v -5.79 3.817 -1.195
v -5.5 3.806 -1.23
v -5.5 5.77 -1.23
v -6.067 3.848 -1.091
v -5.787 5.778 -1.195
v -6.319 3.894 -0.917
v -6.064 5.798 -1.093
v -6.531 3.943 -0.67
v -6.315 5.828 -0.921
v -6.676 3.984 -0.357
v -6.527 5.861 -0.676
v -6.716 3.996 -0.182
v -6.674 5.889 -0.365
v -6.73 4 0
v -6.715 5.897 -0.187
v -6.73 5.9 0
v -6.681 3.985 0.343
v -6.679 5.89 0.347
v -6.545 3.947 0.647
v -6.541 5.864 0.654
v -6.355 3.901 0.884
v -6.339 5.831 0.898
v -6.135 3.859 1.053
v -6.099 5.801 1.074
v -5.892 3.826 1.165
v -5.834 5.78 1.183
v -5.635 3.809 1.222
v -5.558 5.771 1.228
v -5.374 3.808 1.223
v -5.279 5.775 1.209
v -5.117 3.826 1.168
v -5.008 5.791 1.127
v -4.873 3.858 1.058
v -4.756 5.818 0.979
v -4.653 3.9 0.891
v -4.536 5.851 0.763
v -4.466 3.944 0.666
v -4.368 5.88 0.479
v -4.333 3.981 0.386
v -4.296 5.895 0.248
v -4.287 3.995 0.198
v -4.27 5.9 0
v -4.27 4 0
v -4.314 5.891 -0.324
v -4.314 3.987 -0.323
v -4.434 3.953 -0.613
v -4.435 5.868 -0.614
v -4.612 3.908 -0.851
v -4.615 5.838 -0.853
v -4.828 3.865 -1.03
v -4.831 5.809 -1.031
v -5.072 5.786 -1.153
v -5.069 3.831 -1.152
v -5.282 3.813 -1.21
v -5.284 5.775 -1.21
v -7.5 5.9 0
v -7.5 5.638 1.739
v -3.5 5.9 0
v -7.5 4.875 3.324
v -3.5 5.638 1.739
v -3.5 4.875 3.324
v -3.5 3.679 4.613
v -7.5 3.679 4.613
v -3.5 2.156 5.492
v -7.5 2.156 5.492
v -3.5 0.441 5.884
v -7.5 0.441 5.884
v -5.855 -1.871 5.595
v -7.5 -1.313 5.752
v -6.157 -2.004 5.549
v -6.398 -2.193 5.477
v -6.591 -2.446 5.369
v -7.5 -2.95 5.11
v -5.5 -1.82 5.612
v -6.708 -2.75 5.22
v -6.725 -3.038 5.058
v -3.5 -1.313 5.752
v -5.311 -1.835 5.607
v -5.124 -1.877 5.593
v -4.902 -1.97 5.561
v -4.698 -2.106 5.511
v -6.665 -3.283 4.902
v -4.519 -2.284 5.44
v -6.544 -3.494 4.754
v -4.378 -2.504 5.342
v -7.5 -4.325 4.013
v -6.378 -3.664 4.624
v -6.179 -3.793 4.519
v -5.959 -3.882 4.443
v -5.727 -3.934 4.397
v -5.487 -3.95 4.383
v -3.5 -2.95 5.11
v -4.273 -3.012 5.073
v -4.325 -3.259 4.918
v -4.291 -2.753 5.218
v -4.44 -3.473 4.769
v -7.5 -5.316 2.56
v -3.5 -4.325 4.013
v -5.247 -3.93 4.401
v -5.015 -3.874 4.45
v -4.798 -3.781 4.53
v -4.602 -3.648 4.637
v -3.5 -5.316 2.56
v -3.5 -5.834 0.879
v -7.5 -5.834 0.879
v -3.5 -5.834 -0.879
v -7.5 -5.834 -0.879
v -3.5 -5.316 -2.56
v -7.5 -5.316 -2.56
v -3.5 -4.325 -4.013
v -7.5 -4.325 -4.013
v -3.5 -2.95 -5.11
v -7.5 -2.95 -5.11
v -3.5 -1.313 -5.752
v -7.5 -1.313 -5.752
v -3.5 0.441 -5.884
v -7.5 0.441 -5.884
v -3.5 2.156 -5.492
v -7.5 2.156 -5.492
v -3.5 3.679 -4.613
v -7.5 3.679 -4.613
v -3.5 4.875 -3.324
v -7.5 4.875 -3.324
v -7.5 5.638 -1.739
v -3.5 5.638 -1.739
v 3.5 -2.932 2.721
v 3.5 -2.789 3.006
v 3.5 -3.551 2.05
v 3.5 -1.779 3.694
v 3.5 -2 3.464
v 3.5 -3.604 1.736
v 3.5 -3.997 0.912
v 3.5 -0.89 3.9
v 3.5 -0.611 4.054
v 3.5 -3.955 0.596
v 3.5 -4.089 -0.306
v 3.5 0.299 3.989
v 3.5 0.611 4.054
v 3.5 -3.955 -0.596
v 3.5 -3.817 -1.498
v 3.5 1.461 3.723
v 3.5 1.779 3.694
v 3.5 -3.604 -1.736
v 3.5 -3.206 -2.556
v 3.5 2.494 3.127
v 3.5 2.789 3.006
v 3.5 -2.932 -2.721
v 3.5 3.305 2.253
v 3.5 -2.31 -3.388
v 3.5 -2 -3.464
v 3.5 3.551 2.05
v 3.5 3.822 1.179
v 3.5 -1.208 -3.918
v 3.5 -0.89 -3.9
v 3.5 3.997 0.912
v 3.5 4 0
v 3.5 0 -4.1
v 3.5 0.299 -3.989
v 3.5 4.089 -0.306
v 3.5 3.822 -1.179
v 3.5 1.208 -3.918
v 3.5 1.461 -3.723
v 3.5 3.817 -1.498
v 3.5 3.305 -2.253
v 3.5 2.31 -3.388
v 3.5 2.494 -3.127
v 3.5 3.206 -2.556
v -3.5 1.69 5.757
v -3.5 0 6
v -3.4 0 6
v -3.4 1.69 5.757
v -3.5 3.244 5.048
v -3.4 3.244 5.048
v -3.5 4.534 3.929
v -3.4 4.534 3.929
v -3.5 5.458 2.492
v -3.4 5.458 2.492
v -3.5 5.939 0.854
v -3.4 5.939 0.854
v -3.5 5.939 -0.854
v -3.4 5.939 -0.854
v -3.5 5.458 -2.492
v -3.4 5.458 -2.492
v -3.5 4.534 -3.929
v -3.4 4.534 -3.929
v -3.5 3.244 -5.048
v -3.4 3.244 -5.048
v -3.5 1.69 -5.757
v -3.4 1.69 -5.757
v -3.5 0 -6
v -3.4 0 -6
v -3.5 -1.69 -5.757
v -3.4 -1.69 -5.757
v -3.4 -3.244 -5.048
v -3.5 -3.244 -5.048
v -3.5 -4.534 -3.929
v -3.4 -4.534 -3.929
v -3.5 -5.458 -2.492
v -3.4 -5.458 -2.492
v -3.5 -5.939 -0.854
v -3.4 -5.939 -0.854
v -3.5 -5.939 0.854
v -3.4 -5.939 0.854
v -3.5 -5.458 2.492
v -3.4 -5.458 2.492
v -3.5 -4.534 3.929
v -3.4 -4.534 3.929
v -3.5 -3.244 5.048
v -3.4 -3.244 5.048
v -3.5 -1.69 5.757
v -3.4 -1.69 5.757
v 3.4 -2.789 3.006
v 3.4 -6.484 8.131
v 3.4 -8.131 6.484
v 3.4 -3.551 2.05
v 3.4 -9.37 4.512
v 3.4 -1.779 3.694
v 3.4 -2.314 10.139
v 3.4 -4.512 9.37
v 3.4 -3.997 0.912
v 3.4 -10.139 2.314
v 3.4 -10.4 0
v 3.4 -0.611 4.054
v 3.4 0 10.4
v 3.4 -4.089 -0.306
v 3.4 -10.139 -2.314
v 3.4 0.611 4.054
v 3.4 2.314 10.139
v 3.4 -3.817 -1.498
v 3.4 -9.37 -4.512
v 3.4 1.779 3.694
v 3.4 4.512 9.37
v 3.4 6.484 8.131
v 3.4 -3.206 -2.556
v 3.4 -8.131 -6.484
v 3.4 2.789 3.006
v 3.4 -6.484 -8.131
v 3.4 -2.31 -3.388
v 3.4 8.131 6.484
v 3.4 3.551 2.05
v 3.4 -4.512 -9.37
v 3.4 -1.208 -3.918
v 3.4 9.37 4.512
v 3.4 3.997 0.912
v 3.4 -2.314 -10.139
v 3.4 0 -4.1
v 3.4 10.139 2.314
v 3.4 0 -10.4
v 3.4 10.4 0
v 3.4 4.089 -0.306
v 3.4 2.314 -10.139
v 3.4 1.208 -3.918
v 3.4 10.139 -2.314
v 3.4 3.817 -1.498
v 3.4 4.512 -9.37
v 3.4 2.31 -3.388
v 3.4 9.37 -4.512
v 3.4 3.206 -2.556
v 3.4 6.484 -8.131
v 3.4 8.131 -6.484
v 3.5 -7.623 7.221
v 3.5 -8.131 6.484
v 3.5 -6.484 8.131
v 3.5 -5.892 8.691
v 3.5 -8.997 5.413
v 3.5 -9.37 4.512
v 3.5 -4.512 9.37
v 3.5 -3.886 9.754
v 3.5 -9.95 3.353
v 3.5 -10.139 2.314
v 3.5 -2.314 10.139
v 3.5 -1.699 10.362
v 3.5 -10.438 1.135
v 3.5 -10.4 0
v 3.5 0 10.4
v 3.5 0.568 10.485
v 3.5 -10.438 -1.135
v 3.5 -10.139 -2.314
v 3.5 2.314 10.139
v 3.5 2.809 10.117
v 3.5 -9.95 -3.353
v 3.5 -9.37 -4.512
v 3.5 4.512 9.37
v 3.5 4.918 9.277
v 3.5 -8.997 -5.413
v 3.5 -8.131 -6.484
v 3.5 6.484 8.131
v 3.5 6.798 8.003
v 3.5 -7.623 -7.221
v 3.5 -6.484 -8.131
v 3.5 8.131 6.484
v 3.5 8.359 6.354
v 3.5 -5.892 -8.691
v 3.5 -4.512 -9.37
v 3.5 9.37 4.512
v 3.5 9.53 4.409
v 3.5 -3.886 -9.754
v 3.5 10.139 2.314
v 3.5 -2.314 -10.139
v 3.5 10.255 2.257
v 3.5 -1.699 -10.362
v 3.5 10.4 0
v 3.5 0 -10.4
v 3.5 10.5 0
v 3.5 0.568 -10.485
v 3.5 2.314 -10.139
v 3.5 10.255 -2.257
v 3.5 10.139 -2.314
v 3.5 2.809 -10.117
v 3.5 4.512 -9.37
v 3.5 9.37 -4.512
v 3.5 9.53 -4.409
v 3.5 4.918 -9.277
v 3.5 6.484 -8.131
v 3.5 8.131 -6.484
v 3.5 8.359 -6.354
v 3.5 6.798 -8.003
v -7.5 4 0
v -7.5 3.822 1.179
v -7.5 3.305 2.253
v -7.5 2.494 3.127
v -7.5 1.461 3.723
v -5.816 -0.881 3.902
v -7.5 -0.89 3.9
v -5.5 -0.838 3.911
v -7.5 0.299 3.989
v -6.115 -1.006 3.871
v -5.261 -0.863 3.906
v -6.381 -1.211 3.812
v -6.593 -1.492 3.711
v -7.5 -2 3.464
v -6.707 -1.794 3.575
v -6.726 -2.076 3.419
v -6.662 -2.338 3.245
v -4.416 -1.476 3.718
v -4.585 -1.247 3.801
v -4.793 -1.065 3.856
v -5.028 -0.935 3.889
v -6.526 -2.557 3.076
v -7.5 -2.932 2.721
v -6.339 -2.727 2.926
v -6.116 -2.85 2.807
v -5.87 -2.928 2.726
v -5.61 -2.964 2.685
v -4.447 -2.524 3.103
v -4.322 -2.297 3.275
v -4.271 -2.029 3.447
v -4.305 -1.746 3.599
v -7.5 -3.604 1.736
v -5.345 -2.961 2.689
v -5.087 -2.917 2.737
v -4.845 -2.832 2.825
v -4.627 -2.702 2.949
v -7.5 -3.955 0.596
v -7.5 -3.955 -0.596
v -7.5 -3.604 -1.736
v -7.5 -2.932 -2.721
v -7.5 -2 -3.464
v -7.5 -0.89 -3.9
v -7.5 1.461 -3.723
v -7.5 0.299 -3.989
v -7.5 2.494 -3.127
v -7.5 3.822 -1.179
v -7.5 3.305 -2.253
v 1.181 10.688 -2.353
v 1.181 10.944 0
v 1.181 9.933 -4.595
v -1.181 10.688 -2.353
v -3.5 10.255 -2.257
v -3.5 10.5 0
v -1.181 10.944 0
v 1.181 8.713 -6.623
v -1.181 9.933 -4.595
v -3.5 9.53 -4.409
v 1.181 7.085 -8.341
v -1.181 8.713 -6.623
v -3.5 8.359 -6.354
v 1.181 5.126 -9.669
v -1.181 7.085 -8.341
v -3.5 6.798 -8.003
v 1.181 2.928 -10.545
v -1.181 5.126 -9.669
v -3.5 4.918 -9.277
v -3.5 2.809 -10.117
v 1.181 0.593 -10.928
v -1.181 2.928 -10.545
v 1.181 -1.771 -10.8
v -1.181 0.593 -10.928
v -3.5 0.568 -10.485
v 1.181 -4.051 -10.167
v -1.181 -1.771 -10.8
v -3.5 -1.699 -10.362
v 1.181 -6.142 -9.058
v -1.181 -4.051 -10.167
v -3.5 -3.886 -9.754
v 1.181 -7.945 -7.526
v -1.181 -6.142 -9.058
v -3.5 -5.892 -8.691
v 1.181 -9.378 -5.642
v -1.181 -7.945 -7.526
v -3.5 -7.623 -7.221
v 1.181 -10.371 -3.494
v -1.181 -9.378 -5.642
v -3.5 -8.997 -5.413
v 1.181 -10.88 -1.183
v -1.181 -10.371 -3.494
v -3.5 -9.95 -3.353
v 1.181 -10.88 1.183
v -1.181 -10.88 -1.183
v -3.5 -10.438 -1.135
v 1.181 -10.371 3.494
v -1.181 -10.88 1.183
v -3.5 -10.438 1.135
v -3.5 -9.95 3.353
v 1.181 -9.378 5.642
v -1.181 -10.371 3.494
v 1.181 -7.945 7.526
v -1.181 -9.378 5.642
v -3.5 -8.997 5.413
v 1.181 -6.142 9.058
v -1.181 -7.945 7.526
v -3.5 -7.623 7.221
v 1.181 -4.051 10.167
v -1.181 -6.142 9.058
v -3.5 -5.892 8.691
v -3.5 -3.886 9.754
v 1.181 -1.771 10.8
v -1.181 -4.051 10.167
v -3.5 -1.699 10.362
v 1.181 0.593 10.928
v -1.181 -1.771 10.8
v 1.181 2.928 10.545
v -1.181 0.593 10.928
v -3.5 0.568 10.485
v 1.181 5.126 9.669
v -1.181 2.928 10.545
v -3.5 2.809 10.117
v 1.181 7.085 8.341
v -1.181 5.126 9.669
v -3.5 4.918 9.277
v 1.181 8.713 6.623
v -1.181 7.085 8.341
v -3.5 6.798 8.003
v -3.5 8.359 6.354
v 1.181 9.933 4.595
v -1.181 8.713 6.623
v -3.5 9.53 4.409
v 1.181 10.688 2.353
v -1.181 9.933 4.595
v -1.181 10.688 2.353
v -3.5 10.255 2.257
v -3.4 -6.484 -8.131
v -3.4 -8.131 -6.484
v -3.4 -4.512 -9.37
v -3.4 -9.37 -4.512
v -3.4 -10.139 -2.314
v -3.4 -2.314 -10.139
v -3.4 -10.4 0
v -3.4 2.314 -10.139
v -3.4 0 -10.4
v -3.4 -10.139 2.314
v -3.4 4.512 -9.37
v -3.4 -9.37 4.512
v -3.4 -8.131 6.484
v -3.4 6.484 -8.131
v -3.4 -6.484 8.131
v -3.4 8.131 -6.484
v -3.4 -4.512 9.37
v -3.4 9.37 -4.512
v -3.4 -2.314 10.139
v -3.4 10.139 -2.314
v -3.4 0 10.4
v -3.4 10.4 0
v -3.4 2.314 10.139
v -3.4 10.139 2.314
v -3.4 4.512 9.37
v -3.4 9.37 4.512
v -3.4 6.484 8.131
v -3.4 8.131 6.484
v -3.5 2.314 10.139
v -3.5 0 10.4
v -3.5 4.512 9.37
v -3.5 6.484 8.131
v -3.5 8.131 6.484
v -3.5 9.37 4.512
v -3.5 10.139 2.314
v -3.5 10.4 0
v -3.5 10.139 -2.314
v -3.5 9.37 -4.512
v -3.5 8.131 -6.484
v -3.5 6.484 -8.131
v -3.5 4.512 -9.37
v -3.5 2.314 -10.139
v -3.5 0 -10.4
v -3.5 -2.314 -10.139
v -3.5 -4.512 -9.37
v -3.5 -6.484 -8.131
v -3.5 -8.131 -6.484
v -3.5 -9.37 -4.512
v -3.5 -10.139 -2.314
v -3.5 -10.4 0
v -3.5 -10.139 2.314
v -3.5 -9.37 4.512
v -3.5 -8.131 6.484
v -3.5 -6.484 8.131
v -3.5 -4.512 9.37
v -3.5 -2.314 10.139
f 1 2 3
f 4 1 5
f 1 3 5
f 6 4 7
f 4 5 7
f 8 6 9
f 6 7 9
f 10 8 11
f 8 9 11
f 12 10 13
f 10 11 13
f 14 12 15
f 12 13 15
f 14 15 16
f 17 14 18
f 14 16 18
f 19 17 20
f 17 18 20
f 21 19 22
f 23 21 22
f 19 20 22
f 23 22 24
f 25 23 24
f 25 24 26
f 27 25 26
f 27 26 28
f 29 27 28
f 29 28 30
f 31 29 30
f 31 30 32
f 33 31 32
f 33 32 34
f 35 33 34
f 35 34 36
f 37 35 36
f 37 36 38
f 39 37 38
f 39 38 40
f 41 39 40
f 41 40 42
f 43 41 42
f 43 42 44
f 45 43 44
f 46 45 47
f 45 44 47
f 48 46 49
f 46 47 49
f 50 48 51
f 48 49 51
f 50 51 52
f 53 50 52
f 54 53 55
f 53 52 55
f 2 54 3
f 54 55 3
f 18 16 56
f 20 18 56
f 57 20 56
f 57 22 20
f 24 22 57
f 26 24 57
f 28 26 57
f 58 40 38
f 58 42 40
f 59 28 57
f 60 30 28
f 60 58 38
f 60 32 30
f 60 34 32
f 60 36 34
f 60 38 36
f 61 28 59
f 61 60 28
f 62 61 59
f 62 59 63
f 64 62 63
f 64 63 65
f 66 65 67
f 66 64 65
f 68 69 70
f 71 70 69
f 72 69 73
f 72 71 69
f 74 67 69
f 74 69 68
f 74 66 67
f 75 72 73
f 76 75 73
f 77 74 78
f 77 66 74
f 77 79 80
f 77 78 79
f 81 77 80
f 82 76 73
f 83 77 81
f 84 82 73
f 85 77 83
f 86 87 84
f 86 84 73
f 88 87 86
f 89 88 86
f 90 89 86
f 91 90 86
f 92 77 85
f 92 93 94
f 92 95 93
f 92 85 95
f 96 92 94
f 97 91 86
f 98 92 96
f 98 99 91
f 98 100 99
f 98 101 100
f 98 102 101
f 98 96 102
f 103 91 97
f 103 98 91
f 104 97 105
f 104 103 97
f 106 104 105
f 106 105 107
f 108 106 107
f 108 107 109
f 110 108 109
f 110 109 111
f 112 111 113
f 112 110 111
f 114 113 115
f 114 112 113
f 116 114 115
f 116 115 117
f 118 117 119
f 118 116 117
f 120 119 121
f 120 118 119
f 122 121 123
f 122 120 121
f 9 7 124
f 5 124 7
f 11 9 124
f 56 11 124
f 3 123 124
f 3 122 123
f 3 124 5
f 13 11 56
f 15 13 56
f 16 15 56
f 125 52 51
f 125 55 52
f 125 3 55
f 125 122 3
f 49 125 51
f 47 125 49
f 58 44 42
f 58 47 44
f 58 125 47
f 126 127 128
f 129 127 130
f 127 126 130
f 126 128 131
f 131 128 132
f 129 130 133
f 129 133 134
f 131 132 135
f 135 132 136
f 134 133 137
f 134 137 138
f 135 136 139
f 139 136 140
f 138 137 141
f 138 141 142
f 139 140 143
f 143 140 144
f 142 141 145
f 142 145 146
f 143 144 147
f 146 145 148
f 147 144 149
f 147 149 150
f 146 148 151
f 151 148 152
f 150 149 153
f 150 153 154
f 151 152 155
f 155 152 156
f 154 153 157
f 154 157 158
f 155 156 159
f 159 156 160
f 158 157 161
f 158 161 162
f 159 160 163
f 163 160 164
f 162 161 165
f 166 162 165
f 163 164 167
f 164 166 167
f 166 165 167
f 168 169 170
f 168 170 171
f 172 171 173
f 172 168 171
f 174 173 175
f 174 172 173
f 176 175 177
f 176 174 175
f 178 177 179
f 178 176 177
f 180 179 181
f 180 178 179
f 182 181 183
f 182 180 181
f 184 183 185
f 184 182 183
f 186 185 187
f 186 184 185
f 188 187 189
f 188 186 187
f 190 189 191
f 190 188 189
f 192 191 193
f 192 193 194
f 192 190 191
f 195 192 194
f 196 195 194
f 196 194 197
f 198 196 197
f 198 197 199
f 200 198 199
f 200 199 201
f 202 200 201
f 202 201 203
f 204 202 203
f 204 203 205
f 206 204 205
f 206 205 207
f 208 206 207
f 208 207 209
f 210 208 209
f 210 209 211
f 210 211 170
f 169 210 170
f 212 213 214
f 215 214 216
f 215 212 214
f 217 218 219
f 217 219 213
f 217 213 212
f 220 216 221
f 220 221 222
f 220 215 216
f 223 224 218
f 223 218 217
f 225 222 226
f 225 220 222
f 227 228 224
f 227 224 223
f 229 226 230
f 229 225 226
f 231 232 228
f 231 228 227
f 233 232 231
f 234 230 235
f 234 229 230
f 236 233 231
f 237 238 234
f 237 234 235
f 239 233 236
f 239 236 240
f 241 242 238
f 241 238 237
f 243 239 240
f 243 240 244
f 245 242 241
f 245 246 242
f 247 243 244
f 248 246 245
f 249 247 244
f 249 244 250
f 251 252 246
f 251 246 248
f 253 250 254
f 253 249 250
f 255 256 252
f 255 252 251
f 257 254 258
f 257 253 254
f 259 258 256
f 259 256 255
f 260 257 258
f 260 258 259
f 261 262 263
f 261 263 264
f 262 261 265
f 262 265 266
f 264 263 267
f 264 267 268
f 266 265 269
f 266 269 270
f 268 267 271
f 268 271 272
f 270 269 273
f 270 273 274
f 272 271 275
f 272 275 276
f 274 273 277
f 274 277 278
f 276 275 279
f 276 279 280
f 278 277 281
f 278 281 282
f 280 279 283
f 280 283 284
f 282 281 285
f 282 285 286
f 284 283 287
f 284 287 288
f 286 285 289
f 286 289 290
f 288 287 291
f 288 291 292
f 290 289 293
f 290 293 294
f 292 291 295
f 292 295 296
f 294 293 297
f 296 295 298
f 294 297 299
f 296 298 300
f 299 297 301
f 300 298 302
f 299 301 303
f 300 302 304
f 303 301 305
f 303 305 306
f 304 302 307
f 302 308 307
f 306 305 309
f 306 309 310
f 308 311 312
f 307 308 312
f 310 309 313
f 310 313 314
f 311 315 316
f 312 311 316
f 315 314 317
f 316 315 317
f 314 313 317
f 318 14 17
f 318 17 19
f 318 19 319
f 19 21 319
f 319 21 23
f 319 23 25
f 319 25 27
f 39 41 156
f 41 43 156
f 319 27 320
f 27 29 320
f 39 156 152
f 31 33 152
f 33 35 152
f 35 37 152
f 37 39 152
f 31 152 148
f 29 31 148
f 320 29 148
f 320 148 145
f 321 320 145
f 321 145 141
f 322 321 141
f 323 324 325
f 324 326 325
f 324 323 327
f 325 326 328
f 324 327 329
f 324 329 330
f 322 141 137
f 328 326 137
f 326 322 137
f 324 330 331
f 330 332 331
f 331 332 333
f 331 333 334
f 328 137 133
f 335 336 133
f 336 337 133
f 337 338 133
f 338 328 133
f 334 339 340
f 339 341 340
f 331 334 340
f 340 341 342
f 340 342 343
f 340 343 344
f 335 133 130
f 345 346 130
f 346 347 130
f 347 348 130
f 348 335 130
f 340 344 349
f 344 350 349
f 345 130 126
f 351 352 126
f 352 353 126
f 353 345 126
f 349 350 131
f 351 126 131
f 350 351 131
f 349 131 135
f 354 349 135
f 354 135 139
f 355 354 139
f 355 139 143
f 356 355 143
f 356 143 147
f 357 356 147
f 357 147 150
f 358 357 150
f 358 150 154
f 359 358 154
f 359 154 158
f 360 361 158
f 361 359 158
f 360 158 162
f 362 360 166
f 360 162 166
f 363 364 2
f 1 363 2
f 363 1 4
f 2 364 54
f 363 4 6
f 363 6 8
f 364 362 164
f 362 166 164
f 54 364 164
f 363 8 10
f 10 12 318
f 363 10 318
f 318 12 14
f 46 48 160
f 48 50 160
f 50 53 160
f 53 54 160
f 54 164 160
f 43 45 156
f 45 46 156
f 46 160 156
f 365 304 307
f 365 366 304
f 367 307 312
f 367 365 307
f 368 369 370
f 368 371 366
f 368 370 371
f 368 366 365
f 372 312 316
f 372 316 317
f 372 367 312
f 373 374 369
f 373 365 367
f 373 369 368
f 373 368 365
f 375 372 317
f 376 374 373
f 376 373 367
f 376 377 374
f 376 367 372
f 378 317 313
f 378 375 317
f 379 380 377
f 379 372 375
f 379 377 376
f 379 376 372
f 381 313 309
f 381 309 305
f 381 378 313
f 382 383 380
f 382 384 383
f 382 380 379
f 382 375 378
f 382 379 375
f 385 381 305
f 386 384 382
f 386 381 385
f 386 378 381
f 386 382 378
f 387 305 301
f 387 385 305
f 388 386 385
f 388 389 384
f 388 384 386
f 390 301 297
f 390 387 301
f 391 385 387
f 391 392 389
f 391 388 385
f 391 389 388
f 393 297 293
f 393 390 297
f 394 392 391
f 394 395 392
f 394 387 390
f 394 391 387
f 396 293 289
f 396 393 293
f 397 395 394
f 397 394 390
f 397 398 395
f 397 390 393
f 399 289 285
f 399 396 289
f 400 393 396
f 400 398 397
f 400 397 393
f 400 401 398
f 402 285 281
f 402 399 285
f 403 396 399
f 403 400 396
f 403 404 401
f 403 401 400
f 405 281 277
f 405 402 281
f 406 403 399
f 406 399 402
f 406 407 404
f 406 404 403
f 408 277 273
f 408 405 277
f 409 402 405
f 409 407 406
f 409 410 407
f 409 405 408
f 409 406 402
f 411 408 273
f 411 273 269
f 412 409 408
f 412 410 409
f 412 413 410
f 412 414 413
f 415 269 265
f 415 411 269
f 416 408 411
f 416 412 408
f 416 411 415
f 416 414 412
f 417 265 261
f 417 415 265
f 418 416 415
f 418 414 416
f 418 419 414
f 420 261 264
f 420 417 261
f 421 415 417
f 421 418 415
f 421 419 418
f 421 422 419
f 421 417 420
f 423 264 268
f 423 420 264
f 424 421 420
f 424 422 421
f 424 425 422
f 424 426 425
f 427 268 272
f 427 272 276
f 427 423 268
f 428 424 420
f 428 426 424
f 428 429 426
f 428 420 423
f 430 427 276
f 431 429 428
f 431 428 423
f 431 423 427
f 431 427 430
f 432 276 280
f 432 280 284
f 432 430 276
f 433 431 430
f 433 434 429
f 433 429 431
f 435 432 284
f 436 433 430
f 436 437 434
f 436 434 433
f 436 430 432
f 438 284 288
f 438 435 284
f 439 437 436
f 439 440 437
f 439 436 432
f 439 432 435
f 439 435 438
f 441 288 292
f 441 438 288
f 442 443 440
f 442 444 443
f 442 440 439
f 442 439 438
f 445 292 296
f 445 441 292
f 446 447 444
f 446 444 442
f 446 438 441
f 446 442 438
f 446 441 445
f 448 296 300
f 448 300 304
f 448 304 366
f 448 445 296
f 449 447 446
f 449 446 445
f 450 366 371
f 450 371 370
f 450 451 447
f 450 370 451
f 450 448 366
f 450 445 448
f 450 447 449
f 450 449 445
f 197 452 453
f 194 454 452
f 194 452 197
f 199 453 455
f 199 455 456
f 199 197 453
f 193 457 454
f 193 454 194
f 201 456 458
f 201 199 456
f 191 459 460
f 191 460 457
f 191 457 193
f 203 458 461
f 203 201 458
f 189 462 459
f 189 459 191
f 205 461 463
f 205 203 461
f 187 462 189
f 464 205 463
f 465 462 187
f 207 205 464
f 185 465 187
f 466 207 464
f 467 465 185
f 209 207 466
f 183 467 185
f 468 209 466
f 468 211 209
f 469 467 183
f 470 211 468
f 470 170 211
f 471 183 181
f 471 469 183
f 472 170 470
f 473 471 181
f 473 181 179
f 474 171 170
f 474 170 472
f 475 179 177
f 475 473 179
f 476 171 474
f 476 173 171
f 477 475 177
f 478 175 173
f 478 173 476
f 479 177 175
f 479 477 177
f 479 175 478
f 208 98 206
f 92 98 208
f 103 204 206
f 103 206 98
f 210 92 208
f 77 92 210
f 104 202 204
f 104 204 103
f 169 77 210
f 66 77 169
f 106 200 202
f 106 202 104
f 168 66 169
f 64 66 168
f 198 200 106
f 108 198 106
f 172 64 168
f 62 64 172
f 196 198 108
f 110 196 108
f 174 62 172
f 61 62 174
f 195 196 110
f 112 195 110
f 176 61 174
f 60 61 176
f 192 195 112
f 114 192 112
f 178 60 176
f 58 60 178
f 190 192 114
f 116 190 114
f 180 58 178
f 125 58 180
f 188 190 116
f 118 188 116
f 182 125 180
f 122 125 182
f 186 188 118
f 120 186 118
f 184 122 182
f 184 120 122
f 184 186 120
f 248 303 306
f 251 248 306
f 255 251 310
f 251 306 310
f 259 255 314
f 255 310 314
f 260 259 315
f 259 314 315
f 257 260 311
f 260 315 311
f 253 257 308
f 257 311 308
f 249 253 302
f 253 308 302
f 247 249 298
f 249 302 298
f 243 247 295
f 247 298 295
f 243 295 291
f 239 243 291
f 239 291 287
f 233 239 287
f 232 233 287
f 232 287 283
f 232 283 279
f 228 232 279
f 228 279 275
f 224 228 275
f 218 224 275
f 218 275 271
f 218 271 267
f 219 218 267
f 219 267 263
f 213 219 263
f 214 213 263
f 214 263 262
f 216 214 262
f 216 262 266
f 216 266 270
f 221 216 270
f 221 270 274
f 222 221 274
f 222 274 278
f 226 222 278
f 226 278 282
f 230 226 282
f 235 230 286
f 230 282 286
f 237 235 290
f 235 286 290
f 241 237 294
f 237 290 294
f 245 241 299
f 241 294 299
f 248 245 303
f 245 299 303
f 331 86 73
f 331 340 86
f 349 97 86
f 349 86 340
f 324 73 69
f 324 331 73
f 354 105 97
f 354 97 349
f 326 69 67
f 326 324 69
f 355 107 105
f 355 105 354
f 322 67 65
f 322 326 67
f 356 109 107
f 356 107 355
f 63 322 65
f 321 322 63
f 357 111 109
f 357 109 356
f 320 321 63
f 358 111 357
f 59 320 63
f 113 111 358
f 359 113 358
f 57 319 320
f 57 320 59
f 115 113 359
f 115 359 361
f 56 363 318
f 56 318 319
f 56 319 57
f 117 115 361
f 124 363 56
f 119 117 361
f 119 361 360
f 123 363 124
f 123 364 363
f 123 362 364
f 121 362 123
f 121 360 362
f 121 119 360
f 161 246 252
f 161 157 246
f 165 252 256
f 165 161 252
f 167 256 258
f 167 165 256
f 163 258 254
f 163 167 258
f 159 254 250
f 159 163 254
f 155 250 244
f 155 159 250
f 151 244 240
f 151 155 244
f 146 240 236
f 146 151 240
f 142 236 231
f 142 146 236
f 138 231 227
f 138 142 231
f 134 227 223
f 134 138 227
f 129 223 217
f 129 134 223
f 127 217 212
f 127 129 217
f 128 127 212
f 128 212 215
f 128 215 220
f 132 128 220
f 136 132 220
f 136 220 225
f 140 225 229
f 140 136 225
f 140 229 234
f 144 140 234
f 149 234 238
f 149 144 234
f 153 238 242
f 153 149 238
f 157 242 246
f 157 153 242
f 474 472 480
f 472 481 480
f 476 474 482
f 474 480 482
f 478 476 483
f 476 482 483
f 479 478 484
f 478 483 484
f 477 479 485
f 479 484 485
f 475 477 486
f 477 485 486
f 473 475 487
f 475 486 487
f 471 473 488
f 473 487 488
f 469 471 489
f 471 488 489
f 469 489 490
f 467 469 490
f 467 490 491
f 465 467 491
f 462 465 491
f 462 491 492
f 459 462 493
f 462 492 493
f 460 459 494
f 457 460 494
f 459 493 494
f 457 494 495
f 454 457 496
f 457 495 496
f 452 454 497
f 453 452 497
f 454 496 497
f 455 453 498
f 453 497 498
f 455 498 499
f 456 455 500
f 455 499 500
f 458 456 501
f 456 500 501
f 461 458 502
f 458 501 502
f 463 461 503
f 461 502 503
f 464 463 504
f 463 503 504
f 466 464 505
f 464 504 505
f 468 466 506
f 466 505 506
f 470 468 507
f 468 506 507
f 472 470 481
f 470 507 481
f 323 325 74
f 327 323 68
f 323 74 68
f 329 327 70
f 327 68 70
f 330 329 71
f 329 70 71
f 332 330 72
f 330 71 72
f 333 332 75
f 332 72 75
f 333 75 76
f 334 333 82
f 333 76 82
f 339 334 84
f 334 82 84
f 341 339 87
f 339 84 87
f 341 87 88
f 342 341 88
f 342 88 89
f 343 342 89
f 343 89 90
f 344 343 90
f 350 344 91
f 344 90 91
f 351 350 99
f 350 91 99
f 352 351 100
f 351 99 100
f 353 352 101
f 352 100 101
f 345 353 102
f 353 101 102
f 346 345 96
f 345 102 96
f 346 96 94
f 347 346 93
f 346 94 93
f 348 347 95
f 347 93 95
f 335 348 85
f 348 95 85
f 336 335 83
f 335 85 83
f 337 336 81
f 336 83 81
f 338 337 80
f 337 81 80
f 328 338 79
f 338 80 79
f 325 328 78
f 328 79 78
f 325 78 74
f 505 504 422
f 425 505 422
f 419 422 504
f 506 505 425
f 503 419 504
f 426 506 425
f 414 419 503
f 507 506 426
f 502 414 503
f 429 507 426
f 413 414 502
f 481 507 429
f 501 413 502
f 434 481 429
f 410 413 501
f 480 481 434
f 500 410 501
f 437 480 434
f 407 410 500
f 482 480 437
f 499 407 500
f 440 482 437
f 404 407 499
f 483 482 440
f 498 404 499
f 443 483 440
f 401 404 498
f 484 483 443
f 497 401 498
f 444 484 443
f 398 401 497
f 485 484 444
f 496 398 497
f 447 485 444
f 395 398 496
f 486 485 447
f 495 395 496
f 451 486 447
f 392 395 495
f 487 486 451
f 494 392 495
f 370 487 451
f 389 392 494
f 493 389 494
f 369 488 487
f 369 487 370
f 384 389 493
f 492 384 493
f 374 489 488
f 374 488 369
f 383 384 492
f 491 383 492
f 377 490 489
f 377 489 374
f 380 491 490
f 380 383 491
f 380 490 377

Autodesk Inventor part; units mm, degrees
ref_plane "YZ Plane" through (0, 0, 0) normal (1, 0, 0) x (0, 1, 0)
ref_plane "XZ Plane" through (0, 0, 0) normal (0, 1, 0) x (-1, 0, 0)
ref_plane "XY Plane" through (0, 0, 0) normal (0, 0, 1) x (1, 0, 0)
sketch "Sketch2" plane through (0, 0, 0) normal (0, 0, 1) x (1, 0, 0)
  arc A0 (3.5, 10.5) -> (-3.5, 10.5) centre (0, -1.5) ccw
  line L0 (3.5, 10.5) -> (3.5, 4)
  line L1 (3.5, 0) -> (-7.5, 0)
  line L2 (-7.5, 5.9) -> (-3.5, 5.9)
  line L3 (-3.5, 5.9) -> (-3.5, 10.5)
  line L4 (-7.5, 4) -> (3.5, 4)
  line L5 (-7.5, 4) -> (-7.5, 5.9)
  point P0 (0, 0)
  point P1 (0, 11)
  point P2 (-7.5, 4.95)
  dimension "d1" = 11
  dimension "d2" = 3.5
  dimension "d3" = 10.5
  dimension "d4" = 3.5
  dimension "d5" = 5.9
  dimension "d6" = 11
  dimension "d7" = 4
revolve "Revolution1" add sketch "Sketch2" angle 360 about axis through (3.5, 0, 0) along (-1, 0, 0)
sketch "Sketch3" plane through (0, 0, 0) normal (0, 1, 0) x (-1, 0, 0)
  line L0 (7.5, 5.9) -> (7.5, -5.9) projected
  line L1 (3.5, 5.9) -> (3.5, -5.9) projected
  point P0 (0, 0)
  point P1 (5.5, 0)
  dimension "d9" = 2
hole "Hole1" at (-5.5, 0, 0) direction (0, 1, 0) diameter 2.459 end through all thread size "M3x0.5" class "6H" standard "ISO Metric profile"
pattern_circular "Circular Pattern1" count 2 over 120 about axis through (-2, 0, 0) along (1, 0, 0) of "Hole1"
sketch "Sketch4" plane through (-3.5, 0, 0) normal (-1, 0, 0) x (0, 0, 1)
  circle A0 centre (0, 0) radius 5.9 projected
  circle A1 centre (0, 0) radius 10.5 projected
  circle A2 centre (0, 0) radius 6
  circle A3 centre (0, 0) radius 10.4
  point P0 (0, 0)
  dimension "d20" = 0.1
  dimension "d21" = 0.1
sketch "Sketch4 outline for Extrusion1" plane through (-3.5, 0, 0) normal (-1, 0, 0) x (0, 0, 1)
  circle A0 centre (0, 0) radius 10.4
  circle A1 centre (0, 0) radius 6
extrude "Extrusion1" cut sketch "Sketch4 outline for Extrusion1" against normal blind 0.1
sketch "Sketch5" plane through (3.5, 0, 0) normal (1, 0, 0) x (0, 0, -1)
  circle A0 centre (0, 0) radius 10.5 projected
  circle A1 centre (0, 0) radius 4 projected
  circle A2 centre (0, 0) radius 10.4
  circle A3 centre (0, 0) radius 4.1
  point P0 (0, 0)
  dimension "d24" = 0.1
  dimension "d25" = 0.1
sketch "Sketch5 outline for Extrusion2" plane through (3.5, 0, 0) normal (1, 0, 0) x (0, 0, -1)
  circle A0 centre (0, 0) radius 10.4
  circle A1 centre (0, 0) radius 4.1
extrude "Extrusion2" cut sketch "Sketch5 outline for Extrusion2" against normal blind 0.1
equation "\"d4\" = d2"
properties part number "conische lager" material "Stainless Steel"
